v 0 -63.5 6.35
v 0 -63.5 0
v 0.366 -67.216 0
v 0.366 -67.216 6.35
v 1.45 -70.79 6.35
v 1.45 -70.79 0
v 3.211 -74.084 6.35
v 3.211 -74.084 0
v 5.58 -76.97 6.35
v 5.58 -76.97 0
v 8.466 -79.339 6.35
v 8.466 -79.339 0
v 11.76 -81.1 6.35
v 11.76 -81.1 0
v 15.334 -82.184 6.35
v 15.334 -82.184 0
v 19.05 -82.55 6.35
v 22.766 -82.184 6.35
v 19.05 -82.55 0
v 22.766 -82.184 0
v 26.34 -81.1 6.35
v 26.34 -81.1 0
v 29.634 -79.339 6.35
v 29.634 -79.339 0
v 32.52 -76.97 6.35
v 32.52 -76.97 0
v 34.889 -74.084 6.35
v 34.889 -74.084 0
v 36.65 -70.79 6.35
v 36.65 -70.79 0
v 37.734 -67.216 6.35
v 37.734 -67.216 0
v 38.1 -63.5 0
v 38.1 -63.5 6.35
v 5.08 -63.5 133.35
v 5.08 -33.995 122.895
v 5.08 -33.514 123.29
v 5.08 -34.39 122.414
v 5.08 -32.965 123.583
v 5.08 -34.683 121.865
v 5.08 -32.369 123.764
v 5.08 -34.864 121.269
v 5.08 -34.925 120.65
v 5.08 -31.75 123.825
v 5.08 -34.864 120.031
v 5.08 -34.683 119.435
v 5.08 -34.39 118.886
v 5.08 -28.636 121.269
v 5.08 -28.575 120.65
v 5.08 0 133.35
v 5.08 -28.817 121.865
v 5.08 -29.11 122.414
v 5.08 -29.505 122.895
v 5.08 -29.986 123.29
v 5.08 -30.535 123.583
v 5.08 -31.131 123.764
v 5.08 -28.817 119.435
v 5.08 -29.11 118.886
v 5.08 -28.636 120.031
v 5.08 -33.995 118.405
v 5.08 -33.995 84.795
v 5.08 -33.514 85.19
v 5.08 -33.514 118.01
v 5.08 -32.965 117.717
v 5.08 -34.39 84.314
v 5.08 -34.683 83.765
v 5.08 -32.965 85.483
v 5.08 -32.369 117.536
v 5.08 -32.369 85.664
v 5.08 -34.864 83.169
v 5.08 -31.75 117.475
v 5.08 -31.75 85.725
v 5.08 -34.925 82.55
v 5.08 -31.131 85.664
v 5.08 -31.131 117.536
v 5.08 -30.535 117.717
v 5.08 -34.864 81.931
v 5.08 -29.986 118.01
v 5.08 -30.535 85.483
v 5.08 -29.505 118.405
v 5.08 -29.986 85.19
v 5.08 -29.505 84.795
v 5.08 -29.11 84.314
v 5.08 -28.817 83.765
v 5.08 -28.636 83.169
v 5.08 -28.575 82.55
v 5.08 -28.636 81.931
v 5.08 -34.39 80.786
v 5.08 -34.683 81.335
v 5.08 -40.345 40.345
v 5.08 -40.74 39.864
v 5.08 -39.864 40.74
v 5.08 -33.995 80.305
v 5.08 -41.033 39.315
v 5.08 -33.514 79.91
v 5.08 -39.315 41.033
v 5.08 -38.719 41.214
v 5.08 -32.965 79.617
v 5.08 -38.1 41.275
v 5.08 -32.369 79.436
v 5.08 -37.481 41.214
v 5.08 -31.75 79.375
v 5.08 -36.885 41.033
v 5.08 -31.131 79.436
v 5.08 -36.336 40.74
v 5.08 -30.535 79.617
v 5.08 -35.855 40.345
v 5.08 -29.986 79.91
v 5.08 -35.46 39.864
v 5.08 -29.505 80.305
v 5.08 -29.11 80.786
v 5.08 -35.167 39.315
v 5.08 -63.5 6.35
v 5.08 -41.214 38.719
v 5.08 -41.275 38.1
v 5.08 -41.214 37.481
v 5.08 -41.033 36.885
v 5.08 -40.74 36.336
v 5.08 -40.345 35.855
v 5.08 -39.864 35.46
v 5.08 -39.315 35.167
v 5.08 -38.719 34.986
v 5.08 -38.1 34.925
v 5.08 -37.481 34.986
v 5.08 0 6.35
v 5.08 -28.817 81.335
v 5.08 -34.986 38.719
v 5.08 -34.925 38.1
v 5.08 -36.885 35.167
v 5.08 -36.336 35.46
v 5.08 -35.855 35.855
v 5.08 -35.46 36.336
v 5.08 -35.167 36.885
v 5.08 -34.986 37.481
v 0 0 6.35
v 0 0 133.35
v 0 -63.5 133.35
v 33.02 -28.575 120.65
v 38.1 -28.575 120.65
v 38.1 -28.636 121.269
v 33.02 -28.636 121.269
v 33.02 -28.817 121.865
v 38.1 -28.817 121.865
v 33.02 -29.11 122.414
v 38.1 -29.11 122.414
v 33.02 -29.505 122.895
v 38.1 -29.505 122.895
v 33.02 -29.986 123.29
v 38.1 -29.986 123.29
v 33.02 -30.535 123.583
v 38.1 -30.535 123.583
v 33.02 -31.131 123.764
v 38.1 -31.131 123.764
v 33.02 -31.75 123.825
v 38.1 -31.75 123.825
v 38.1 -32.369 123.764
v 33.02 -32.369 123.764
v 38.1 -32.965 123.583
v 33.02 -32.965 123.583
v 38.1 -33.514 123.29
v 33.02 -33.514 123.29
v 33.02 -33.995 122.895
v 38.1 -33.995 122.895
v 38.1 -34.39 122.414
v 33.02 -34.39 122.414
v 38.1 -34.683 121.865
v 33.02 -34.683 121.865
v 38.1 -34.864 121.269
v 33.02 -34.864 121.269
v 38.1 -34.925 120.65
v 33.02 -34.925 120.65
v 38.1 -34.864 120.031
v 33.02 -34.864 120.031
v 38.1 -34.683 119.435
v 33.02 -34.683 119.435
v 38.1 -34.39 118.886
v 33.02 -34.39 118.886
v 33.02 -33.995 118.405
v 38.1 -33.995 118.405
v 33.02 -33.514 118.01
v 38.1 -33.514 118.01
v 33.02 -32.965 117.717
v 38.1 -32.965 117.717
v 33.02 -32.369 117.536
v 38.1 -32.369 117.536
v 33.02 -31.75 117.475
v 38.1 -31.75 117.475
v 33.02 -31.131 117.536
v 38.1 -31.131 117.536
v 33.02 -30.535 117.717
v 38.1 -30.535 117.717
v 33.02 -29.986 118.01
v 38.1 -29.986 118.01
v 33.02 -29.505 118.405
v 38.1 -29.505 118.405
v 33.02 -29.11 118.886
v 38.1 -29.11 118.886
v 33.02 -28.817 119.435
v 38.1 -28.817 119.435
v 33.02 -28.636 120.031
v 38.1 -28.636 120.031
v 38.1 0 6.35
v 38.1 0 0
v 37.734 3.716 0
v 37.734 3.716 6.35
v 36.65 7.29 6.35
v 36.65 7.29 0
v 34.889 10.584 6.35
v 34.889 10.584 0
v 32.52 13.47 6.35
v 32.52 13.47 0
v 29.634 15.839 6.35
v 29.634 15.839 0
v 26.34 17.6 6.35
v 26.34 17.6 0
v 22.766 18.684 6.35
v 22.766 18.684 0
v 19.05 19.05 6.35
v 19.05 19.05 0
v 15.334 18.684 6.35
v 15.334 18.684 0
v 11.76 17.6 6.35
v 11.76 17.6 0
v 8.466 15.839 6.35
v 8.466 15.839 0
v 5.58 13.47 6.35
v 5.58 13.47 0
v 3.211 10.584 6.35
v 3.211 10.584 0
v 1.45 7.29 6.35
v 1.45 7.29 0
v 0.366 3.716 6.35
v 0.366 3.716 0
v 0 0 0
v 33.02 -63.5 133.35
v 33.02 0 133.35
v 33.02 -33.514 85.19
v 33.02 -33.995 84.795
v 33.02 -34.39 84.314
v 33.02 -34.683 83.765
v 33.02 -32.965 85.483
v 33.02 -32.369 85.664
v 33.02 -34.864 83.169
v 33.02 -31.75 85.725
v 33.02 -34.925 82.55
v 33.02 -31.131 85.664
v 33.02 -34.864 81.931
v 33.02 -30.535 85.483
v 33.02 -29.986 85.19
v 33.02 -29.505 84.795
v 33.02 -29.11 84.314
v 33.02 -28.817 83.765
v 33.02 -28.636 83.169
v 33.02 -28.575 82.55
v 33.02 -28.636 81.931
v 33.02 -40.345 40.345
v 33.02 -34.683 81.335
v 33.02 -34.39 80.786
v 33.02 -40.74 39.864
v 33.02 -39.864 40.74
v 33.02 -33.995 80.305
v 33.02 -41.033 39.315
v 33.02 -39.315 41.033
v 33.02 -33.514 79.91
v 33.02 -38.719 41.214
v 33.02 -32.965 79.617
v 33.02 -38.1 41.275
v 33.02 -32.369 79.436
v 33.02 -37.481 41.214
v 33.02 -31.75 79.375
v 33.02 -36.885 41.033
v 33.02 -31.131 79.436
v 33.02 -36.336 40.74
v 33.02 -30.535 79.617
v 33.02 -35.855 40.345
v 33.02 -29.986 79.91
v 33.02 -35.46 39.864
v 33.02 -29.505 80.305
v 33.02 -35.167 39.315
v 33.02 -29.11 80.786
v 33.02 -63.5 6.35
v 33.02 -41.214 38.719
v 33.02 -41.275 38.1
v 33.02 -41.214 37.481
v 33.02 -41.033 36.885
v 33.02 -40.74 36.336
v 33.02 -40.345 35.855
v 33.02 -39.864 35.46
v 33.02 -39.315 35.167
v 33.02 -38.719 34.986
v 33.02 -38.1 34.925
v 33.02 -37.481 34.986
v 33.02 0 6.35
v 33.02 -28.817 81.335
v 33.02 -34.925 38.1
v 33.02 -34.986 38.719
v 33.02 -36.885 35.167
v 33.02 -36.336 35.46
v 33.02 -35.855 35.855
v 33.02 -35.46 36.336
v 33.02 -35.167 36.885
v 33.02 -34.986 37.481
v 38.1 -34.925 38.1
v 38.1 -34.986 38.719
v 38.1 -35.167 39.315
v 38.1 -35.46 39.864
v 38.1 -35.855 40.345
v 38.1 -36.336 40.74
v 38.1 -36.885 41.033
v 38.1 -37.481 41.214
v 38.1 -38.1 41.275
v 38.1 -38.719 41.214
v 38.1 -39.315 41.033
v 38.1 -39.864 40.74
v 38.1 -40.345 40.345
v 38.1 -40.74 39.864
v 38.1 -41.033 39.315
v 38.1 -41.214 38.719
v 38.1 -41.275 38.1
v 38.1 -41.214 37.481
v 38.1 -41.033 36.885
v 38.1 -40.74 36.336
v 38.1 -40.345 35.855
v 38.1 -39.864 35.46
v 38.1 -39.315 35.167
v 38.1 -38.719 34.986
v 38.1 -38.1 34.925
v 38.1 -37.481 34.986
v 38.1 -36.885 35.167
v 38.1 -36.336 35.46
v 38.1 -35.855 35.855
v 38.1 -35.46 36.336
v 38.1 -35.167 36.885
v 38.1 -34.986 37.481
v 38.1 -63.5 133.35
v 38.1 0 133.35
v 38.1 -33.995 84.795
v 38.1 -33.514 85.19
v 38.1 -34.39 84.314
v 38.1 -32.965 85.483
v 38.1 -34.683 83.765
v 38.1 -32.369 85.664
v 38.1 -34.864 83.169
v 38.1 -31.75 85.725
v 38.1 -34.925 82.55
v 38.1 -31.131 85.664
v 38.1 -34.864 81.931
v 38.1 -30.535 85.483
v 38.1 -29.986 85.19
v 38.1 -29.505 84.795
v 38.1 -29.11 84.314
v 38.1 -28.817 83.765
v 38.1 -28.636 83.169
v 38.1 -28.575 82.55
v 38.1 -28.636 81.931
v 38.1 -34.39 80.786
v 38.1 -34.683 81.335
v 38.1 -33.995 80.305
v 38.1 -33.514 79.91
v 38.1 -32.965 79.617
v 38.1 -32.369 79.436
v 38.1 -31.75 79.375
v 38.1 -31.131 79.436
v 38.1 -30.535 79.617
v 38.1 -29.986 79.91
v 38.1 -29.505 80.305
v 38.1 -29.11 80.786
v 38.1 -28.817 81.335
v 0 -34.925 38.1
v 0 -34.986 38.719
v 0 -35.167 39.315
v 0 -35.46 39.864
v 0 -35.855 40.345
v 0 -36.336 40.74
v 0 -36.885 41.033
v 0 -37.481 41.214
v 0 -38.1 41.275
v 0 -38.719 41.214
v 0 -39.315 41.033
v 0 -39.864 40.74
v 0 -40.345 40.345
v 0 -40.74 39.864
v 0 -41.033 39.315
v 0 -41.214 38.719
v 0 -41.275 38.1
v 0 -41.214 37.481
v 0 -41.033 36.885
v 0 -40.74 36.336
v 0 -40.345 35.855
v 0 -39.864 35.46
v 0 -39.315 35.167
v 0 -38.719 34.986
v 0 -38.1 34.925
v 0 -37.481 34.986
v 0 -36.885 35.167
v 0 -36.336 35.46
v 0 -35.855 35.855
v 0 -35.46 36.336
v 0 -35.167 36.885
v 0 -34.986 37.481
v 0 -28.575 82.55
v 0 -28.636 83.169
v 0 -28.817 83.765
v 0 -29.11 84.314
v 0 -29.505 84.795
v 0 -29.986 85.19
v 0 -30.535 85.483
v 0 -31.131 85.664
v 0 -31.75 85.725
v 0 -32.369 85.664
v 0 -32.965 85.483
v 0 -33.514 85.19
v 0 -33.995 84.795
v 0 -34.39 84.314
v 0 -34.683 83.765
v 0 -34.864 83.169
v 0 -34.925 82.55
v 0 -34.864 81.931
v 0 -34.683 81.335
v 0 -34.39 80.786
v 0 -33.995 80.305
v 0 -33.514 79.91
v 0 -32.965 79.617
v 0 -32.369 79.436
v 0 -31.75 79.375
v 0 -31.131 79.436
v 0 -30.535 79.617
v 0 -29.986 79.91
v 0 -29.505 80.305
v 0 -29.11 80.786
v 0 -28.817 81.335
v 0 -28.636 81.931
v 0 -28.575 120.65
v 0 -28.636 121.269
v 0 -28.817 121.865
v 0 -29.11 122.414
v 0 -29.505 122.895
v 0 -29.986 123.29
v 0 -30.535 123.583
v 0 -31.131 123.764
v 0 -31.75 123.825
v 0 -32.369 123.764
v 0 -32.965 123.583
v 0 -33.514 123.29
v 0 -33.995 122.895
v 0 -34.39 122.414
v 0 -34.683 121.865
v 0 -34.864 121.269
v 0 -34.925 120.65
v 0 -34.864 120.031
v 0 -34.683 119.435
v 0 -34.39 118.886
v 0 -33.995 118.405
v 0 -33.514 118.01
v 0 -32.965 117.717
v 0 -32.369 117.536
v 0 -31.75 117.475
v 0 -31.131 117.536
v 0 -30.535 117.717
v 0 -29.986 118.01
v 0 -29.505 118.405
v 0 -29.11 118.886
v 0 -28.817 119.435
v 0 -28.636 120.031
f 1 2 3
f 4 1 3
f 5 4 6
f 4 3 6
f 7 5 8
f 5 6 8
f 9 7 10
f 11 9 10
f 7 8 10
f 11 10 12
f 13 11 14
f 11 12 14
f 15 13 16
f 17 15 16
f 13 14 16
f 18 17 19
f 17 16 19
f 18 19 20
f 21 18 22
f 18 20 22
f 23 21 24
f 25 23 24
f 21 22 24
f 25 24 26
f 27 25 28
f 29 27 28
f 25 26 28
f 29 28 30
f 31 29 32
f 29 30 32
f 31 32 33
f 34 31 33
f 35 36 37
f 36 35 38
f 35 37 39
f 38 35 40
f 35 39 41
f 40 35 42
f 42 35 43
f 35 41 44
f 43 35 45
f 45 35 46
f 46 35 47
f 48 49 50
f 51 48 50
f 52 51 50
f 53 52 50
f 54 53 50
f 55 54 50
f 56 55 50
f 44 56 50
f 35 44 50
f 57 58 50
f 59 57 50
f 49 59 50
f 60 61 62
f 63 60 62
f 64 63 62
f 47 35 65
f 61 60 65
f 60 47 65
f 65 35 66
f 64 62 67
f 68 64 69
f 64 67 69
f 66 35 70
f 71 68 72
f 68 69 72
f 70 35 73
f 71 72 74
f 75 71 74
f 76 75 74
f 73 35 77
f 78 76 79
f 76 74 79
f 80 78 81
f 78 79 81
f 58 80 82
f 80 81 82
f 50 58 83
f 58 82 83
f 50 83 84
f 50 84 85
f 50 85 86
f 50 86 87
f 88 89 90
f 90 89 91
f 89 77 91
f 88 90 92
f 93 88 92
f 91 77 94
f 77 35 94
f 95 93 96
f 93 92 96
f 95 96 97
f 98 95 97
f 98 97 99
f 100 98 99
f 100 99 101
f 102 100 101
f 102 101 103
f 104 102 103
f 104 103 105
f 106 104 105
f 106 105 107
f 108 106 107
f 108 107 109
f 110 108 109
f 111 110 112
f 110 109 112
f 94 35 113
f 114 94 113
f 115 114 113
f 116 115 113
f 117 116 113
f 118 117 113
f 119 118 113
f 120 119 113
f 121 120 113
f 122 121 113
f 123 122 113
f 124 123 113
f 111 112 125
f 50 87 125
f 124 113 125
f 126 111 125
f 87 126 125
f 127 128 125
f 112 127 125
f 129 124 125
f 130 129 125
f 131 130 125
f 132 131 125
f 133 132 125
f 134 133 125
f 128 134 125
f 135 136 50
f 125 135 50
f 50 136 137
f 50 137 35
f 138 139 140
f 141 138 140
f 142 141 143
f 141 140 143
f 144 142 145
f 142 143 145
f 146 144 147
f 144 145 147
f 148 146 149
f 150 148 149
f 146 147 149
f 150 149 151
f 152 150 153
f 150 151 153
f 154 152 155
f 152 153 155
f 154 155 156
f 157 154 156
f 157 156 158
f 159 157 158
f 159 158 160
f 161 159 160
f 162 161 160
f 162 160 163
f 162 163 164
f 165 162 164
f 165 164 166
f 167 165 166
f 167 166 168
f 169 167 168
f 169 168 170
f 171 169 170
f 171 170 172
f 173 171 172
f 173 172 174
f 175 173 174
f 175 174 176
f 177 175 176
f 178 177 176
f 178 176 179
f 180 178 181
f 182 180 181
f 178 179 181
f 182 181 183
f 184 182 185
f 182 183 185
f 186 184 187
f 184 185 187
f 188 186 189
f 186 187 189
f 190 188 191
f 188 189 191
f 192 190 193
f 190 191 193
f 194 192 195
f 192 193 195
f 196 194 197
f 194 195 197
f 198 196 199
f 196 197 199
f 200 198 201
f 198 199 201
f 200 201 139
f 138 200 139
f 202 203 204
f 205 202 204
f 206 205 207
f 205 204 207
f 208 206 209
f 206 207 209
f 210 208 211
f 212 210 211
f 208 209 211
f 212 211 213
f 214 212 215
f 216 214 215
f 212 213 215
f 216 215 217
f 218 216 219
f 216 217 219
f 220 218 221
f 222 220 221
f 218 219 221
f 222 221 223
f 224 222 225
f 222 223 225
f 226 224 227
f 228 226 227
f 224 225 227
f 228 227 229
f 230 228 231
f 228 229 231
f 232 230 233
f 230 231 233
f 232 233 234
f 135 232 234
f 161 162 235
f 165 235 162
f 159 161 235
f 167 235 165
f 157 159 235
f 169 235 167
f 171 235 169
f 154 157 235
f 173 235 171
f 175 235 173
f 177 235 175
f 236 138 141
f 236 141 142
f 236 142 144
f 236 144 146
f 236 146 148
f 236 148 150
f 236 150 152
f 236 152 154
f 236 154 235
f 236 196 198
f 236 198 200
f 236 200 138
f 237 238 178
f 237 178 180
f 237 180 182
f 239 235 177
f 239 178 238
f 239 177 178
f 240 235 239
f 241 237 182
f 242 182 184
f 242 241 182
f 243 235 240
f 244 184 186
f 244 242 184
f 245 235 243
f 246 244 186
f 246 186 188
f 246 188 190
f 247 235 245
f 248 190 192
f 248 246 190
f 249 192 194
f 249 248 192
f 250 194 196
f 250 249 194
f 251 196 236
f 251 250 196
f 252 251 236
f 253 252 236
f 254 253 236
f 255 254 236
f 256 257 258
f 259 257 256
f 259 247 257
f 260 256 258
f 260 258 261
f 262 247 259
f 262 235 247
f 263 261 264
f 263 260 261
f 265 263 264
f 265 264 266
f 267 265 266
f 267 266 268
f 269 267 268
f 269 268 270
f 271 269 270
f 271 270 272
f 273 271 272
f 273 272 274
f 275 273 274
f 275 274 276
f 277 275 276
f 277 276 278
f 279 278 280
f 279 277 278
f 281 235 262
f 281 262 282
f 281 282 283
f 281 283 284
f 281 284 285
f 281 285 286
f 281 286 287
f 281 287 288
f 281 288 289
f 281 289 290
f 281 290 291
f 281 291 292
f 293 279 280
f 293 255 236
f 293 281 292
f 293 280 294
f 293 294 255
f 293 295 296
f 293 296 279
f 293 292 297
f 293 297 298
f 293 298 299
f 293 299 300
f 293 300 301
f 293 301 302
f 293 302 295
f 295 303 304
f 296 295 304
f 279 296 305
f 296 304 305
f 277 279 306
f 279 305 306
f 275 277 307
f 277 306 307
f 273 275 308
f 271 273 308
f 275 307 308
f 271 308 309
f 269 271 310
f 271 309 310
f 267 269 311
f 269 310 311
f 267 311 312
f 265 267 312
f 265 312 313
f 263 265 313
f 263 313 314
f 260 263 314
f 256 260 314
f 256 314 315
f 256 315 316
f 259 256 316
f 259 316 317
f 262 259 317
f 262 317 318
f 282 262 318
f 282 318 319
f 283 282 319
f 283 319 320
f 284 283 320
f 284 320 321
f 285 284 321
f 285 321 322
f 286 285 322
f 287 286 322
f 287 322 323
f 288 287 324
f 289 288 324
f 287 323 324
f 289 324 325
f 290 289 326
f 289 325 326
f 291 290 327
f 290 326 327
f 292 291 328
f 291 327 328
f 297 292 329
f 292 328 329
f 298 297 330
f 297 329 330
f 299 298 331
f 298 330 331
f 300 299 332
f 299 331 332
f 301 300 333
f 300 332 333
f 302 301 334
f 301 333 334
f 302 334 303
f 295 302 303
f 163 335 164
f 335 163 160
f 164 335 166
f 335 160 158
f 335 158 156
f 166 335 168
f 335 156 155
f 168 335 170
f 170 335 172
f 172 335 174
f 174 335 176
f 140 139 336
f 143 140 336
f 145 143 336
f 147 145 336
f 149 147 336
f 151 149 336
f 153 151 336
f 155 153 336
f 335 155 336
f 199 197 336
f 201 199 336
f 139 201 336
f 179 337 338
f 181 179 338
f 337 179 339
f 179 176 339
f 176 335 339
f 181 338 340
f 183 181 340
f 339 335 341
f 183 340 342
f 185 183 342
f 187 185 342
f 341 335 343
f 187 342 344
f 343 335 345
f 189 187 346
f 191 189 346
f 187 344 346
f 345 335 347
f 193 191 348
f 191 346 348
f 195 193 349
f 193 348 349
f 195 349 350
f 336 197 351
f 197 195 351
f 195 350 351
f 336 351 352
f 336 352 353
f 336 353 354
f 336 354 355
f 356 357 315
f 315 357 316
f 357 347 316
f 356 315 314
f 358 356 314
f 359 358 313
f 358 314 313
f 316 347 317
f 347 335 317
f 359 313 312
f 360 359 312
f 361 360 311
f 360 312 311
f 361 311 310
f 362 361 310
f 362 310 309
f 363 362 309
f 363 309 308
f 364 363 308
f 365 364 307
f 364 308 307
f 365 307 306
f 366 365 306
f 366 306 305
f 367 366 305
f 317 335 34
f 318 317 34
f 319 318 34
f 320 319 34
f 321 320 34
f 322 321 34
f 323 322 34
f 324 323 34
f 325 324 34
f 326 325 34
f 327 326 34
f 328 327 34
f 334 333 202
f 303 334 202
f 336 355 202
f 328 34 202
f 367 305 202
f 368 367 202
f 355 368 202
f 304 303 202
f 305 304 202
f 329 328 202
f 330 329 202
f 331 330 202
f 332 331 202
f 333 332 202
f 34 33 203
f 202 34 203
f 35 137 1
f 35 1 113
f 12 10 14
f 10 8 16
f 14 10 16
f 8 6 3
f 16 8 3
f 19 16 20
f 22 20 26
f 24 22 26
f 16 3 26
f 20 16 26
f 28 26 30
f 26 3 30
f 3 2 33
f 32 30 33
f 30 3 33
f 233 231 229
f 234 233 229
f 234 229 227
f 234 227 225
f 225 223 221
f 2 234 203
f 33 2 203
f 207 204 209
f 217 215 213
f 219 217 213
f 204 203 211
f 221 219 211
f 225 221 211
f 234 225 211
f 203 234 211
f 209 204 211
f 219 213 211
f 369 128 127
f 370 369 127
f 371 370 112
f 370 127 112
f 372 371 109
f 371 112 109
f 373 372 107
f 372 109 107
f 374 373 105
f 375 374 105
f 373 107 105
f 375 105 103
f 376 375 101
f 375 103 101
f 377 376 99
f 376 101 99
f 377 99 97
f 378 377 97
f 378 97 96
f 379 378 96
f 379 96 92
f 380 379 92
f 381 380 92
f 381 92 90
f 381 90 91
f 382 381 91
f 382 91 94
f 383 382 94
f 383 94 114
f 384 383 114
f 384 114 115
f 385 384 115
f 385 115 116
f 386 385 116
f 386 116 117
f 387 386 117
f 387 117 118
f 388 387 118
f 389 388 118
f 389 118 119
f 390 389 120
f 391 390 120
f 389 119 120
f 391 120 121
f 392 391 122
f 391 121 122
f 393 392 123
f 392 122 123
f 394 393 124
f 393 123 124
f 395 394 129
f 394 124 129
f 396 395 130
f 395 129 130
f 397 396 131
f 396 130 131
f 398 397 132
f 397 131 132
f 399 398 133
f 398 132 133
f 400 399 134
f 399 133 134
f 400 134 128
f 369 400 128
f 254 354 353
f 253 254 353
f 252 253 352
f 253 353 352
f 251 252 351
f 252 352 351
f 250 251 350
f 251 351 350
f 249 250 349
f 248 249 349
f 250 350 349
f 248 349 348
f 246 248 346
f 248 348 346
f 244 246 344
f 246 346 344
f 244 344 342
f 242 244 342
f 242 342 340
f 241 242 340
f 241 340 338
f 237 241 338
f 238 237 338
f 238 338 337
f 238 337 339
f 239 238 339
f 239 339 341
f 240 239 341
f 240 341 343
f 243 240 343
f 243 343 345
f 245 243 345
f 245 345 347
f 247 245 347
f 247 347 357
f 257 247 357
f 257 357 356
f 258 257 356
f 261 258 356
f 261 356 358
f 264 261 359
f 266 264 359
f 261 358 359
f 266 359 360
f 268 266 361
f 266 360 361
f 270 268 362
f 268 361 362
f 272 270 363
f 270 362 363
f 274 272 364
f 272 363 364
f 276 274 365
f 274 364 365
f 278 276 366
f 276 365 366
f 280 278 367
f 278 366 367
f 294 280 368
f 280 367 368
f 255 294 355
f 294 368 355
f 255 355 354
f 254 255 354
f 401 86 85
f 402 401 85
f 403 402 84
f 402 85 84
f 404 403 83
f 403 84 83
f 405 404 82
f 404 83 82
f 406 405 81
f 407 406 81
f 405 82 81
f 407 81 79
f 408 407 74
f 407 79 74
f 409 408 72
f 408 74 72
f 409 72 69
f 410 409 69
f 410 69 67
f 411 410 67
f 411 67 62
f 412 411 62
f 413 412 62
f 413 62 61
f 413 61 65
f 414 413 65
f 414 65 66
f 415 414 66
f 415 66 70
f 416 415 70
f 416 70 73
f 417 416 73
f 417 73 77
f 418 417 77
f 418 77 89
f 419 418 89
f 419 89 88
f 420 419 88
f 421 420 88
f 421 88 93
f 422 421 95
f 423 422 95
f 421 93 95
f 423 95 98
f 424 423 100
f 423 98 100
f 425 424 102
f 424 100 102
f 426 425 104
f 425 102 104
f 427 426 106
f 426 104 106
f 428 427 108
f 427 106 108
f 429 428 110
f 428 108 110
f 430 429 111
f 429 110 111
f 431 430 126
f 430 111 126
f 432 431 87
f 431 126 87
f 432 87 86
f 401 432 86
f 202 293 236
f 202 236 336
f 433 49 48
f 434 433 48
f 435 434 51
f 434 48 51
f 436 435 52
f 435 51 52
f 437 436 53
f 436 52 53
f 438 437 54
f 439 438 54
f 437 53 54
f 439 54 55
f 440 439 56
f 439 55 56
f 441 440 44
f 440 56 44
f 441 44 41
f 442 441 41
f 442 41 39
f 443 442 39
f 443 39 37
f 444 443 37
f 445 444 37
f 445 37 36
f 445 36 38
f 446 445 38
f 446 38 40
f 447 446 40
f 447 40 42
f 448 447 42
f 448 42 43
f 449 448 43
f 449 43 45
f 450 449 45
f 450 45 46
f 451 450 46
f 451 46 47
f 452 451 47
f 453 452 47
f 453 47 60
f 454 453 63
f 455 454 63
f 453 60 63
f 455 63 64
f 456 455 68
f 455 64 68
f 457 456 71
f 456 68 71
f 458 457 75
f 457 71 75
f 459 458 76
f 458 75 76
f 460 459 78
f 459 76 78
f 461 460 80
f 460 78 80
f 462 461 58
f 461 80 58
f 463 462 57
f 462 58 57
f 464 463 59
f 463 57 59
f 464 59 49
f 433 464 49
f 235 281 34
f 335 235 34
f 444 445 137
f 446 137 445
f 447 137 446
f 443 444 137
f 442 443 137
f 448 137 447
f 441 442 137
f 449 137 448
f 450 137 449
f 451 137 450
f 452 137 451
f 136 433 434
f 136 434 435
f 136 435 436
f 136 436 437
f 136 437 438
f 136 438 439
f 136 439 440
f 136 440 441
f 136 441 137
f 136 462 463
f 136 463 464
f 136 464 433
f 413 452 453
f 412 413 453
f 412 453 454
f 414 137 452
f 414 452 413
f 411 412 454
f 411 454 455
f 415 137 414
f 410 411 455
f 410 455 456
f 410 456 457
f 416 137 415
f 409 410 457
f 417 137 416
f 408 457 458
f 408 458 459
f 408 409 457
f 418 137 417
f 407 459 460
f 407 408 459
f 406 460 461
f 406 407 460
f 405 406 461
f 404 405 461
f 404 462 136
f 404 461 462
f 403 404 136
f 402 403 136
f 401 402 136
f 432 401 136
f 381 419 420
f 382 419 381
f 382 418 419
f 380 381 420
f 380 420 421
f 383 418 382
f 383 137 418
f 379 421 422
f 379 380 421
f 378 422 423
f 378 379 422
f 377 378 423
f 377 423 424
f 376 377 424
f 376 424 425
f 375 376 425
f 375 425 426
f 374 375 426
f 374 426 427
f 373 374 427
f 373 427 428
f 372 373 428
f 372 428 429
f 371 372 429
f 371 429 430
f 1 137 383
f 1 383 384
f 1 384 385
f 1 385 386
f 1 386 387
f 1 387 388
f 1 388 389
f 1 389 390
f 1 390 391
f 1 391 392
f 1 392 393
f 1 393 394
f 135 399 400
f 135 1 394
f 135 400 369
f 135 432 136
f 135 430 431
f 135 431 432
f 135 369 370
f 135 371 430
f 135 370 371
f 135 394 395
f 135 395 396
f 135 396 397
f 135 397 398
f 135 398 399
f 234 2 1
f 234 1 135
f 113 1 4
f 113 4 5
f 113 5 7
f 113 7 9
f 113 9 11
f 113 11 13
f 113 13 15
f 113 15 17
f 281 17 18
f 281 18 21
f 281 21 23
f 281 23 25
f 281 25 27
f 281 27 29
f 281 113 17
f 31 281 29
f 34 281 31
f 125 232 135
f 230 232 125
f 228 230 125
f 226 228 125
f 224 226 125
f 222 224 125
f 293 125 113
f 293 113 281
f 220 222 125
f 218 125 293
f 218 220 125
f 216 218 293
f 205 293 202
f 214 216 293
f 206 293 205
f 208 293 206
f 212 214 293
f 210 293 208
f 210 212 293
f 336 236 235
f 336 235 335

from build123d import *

# Parameters (mm, degrees)
F1_DEPTH = 6.35
F2_W     = 5.08
F2_H     = 63.5
F3_DEPTH = 127
F4_R     = 3.175
F5_DEPTH = 50.8


with BuildPart() as f1:
    # F0 (on Top) → F1 (new body)
    with BuildSketch(Plane.XY):
        with BuildLine():
            ThreePointArc((38.1, 0), (19.05, -19.05), (0, 0))
            Line((0, 0), (0, -63.5))
            ThreePointArc((0, -63.5), (19.05, -44.45), (38.1, -63.5))
            Line((38.1, -63.5), (38.1, 0))
        make_face()
        with BuildLine():
            ThreePointArc((38.1, 0), (19.05, 19.05), (0, 0))
            ThreePointArc((0, 0), (19.05, -19.05), (38.1, 0))
        make_face()
        with BuildLine():
            ThreePointArc((38.1, -63.5), (19.05, -44.45), (0, -63.5))
            ThreePointArc((0, -63.5), (19.05, -82.55), (38.1, -63.5))
        make_face()
    extrude(amount=F1_DEPTH)

    # F2 (on face) → F3 (join)
    with BuildSketch(Plane.XY.offset(6.35)):
        with Locations((2.54, -31.75)):
            Rectangle(F2_W, F2_H)
        with Locations((35.56, -31.75)):
            Rectangle(F2_W, F2_H)
    extrude(amount=F3_DEPTH)

    # F4 (on face) → F5 (cut)
    with BuildSketch(Plane.YZ.offset(38.1)):
        with Locations((-31.75, 120.65)):
            Circle(F4_R)
        with Locations((-31.75, 82.55)):
            Circle(F4_R)
        with Locations((-38.1, 38.1)):
            Circle(F4_R)
    extrude(amount=-F5_DEPTH, mode=Mode.SUBTRACT)


solid = f1.part
